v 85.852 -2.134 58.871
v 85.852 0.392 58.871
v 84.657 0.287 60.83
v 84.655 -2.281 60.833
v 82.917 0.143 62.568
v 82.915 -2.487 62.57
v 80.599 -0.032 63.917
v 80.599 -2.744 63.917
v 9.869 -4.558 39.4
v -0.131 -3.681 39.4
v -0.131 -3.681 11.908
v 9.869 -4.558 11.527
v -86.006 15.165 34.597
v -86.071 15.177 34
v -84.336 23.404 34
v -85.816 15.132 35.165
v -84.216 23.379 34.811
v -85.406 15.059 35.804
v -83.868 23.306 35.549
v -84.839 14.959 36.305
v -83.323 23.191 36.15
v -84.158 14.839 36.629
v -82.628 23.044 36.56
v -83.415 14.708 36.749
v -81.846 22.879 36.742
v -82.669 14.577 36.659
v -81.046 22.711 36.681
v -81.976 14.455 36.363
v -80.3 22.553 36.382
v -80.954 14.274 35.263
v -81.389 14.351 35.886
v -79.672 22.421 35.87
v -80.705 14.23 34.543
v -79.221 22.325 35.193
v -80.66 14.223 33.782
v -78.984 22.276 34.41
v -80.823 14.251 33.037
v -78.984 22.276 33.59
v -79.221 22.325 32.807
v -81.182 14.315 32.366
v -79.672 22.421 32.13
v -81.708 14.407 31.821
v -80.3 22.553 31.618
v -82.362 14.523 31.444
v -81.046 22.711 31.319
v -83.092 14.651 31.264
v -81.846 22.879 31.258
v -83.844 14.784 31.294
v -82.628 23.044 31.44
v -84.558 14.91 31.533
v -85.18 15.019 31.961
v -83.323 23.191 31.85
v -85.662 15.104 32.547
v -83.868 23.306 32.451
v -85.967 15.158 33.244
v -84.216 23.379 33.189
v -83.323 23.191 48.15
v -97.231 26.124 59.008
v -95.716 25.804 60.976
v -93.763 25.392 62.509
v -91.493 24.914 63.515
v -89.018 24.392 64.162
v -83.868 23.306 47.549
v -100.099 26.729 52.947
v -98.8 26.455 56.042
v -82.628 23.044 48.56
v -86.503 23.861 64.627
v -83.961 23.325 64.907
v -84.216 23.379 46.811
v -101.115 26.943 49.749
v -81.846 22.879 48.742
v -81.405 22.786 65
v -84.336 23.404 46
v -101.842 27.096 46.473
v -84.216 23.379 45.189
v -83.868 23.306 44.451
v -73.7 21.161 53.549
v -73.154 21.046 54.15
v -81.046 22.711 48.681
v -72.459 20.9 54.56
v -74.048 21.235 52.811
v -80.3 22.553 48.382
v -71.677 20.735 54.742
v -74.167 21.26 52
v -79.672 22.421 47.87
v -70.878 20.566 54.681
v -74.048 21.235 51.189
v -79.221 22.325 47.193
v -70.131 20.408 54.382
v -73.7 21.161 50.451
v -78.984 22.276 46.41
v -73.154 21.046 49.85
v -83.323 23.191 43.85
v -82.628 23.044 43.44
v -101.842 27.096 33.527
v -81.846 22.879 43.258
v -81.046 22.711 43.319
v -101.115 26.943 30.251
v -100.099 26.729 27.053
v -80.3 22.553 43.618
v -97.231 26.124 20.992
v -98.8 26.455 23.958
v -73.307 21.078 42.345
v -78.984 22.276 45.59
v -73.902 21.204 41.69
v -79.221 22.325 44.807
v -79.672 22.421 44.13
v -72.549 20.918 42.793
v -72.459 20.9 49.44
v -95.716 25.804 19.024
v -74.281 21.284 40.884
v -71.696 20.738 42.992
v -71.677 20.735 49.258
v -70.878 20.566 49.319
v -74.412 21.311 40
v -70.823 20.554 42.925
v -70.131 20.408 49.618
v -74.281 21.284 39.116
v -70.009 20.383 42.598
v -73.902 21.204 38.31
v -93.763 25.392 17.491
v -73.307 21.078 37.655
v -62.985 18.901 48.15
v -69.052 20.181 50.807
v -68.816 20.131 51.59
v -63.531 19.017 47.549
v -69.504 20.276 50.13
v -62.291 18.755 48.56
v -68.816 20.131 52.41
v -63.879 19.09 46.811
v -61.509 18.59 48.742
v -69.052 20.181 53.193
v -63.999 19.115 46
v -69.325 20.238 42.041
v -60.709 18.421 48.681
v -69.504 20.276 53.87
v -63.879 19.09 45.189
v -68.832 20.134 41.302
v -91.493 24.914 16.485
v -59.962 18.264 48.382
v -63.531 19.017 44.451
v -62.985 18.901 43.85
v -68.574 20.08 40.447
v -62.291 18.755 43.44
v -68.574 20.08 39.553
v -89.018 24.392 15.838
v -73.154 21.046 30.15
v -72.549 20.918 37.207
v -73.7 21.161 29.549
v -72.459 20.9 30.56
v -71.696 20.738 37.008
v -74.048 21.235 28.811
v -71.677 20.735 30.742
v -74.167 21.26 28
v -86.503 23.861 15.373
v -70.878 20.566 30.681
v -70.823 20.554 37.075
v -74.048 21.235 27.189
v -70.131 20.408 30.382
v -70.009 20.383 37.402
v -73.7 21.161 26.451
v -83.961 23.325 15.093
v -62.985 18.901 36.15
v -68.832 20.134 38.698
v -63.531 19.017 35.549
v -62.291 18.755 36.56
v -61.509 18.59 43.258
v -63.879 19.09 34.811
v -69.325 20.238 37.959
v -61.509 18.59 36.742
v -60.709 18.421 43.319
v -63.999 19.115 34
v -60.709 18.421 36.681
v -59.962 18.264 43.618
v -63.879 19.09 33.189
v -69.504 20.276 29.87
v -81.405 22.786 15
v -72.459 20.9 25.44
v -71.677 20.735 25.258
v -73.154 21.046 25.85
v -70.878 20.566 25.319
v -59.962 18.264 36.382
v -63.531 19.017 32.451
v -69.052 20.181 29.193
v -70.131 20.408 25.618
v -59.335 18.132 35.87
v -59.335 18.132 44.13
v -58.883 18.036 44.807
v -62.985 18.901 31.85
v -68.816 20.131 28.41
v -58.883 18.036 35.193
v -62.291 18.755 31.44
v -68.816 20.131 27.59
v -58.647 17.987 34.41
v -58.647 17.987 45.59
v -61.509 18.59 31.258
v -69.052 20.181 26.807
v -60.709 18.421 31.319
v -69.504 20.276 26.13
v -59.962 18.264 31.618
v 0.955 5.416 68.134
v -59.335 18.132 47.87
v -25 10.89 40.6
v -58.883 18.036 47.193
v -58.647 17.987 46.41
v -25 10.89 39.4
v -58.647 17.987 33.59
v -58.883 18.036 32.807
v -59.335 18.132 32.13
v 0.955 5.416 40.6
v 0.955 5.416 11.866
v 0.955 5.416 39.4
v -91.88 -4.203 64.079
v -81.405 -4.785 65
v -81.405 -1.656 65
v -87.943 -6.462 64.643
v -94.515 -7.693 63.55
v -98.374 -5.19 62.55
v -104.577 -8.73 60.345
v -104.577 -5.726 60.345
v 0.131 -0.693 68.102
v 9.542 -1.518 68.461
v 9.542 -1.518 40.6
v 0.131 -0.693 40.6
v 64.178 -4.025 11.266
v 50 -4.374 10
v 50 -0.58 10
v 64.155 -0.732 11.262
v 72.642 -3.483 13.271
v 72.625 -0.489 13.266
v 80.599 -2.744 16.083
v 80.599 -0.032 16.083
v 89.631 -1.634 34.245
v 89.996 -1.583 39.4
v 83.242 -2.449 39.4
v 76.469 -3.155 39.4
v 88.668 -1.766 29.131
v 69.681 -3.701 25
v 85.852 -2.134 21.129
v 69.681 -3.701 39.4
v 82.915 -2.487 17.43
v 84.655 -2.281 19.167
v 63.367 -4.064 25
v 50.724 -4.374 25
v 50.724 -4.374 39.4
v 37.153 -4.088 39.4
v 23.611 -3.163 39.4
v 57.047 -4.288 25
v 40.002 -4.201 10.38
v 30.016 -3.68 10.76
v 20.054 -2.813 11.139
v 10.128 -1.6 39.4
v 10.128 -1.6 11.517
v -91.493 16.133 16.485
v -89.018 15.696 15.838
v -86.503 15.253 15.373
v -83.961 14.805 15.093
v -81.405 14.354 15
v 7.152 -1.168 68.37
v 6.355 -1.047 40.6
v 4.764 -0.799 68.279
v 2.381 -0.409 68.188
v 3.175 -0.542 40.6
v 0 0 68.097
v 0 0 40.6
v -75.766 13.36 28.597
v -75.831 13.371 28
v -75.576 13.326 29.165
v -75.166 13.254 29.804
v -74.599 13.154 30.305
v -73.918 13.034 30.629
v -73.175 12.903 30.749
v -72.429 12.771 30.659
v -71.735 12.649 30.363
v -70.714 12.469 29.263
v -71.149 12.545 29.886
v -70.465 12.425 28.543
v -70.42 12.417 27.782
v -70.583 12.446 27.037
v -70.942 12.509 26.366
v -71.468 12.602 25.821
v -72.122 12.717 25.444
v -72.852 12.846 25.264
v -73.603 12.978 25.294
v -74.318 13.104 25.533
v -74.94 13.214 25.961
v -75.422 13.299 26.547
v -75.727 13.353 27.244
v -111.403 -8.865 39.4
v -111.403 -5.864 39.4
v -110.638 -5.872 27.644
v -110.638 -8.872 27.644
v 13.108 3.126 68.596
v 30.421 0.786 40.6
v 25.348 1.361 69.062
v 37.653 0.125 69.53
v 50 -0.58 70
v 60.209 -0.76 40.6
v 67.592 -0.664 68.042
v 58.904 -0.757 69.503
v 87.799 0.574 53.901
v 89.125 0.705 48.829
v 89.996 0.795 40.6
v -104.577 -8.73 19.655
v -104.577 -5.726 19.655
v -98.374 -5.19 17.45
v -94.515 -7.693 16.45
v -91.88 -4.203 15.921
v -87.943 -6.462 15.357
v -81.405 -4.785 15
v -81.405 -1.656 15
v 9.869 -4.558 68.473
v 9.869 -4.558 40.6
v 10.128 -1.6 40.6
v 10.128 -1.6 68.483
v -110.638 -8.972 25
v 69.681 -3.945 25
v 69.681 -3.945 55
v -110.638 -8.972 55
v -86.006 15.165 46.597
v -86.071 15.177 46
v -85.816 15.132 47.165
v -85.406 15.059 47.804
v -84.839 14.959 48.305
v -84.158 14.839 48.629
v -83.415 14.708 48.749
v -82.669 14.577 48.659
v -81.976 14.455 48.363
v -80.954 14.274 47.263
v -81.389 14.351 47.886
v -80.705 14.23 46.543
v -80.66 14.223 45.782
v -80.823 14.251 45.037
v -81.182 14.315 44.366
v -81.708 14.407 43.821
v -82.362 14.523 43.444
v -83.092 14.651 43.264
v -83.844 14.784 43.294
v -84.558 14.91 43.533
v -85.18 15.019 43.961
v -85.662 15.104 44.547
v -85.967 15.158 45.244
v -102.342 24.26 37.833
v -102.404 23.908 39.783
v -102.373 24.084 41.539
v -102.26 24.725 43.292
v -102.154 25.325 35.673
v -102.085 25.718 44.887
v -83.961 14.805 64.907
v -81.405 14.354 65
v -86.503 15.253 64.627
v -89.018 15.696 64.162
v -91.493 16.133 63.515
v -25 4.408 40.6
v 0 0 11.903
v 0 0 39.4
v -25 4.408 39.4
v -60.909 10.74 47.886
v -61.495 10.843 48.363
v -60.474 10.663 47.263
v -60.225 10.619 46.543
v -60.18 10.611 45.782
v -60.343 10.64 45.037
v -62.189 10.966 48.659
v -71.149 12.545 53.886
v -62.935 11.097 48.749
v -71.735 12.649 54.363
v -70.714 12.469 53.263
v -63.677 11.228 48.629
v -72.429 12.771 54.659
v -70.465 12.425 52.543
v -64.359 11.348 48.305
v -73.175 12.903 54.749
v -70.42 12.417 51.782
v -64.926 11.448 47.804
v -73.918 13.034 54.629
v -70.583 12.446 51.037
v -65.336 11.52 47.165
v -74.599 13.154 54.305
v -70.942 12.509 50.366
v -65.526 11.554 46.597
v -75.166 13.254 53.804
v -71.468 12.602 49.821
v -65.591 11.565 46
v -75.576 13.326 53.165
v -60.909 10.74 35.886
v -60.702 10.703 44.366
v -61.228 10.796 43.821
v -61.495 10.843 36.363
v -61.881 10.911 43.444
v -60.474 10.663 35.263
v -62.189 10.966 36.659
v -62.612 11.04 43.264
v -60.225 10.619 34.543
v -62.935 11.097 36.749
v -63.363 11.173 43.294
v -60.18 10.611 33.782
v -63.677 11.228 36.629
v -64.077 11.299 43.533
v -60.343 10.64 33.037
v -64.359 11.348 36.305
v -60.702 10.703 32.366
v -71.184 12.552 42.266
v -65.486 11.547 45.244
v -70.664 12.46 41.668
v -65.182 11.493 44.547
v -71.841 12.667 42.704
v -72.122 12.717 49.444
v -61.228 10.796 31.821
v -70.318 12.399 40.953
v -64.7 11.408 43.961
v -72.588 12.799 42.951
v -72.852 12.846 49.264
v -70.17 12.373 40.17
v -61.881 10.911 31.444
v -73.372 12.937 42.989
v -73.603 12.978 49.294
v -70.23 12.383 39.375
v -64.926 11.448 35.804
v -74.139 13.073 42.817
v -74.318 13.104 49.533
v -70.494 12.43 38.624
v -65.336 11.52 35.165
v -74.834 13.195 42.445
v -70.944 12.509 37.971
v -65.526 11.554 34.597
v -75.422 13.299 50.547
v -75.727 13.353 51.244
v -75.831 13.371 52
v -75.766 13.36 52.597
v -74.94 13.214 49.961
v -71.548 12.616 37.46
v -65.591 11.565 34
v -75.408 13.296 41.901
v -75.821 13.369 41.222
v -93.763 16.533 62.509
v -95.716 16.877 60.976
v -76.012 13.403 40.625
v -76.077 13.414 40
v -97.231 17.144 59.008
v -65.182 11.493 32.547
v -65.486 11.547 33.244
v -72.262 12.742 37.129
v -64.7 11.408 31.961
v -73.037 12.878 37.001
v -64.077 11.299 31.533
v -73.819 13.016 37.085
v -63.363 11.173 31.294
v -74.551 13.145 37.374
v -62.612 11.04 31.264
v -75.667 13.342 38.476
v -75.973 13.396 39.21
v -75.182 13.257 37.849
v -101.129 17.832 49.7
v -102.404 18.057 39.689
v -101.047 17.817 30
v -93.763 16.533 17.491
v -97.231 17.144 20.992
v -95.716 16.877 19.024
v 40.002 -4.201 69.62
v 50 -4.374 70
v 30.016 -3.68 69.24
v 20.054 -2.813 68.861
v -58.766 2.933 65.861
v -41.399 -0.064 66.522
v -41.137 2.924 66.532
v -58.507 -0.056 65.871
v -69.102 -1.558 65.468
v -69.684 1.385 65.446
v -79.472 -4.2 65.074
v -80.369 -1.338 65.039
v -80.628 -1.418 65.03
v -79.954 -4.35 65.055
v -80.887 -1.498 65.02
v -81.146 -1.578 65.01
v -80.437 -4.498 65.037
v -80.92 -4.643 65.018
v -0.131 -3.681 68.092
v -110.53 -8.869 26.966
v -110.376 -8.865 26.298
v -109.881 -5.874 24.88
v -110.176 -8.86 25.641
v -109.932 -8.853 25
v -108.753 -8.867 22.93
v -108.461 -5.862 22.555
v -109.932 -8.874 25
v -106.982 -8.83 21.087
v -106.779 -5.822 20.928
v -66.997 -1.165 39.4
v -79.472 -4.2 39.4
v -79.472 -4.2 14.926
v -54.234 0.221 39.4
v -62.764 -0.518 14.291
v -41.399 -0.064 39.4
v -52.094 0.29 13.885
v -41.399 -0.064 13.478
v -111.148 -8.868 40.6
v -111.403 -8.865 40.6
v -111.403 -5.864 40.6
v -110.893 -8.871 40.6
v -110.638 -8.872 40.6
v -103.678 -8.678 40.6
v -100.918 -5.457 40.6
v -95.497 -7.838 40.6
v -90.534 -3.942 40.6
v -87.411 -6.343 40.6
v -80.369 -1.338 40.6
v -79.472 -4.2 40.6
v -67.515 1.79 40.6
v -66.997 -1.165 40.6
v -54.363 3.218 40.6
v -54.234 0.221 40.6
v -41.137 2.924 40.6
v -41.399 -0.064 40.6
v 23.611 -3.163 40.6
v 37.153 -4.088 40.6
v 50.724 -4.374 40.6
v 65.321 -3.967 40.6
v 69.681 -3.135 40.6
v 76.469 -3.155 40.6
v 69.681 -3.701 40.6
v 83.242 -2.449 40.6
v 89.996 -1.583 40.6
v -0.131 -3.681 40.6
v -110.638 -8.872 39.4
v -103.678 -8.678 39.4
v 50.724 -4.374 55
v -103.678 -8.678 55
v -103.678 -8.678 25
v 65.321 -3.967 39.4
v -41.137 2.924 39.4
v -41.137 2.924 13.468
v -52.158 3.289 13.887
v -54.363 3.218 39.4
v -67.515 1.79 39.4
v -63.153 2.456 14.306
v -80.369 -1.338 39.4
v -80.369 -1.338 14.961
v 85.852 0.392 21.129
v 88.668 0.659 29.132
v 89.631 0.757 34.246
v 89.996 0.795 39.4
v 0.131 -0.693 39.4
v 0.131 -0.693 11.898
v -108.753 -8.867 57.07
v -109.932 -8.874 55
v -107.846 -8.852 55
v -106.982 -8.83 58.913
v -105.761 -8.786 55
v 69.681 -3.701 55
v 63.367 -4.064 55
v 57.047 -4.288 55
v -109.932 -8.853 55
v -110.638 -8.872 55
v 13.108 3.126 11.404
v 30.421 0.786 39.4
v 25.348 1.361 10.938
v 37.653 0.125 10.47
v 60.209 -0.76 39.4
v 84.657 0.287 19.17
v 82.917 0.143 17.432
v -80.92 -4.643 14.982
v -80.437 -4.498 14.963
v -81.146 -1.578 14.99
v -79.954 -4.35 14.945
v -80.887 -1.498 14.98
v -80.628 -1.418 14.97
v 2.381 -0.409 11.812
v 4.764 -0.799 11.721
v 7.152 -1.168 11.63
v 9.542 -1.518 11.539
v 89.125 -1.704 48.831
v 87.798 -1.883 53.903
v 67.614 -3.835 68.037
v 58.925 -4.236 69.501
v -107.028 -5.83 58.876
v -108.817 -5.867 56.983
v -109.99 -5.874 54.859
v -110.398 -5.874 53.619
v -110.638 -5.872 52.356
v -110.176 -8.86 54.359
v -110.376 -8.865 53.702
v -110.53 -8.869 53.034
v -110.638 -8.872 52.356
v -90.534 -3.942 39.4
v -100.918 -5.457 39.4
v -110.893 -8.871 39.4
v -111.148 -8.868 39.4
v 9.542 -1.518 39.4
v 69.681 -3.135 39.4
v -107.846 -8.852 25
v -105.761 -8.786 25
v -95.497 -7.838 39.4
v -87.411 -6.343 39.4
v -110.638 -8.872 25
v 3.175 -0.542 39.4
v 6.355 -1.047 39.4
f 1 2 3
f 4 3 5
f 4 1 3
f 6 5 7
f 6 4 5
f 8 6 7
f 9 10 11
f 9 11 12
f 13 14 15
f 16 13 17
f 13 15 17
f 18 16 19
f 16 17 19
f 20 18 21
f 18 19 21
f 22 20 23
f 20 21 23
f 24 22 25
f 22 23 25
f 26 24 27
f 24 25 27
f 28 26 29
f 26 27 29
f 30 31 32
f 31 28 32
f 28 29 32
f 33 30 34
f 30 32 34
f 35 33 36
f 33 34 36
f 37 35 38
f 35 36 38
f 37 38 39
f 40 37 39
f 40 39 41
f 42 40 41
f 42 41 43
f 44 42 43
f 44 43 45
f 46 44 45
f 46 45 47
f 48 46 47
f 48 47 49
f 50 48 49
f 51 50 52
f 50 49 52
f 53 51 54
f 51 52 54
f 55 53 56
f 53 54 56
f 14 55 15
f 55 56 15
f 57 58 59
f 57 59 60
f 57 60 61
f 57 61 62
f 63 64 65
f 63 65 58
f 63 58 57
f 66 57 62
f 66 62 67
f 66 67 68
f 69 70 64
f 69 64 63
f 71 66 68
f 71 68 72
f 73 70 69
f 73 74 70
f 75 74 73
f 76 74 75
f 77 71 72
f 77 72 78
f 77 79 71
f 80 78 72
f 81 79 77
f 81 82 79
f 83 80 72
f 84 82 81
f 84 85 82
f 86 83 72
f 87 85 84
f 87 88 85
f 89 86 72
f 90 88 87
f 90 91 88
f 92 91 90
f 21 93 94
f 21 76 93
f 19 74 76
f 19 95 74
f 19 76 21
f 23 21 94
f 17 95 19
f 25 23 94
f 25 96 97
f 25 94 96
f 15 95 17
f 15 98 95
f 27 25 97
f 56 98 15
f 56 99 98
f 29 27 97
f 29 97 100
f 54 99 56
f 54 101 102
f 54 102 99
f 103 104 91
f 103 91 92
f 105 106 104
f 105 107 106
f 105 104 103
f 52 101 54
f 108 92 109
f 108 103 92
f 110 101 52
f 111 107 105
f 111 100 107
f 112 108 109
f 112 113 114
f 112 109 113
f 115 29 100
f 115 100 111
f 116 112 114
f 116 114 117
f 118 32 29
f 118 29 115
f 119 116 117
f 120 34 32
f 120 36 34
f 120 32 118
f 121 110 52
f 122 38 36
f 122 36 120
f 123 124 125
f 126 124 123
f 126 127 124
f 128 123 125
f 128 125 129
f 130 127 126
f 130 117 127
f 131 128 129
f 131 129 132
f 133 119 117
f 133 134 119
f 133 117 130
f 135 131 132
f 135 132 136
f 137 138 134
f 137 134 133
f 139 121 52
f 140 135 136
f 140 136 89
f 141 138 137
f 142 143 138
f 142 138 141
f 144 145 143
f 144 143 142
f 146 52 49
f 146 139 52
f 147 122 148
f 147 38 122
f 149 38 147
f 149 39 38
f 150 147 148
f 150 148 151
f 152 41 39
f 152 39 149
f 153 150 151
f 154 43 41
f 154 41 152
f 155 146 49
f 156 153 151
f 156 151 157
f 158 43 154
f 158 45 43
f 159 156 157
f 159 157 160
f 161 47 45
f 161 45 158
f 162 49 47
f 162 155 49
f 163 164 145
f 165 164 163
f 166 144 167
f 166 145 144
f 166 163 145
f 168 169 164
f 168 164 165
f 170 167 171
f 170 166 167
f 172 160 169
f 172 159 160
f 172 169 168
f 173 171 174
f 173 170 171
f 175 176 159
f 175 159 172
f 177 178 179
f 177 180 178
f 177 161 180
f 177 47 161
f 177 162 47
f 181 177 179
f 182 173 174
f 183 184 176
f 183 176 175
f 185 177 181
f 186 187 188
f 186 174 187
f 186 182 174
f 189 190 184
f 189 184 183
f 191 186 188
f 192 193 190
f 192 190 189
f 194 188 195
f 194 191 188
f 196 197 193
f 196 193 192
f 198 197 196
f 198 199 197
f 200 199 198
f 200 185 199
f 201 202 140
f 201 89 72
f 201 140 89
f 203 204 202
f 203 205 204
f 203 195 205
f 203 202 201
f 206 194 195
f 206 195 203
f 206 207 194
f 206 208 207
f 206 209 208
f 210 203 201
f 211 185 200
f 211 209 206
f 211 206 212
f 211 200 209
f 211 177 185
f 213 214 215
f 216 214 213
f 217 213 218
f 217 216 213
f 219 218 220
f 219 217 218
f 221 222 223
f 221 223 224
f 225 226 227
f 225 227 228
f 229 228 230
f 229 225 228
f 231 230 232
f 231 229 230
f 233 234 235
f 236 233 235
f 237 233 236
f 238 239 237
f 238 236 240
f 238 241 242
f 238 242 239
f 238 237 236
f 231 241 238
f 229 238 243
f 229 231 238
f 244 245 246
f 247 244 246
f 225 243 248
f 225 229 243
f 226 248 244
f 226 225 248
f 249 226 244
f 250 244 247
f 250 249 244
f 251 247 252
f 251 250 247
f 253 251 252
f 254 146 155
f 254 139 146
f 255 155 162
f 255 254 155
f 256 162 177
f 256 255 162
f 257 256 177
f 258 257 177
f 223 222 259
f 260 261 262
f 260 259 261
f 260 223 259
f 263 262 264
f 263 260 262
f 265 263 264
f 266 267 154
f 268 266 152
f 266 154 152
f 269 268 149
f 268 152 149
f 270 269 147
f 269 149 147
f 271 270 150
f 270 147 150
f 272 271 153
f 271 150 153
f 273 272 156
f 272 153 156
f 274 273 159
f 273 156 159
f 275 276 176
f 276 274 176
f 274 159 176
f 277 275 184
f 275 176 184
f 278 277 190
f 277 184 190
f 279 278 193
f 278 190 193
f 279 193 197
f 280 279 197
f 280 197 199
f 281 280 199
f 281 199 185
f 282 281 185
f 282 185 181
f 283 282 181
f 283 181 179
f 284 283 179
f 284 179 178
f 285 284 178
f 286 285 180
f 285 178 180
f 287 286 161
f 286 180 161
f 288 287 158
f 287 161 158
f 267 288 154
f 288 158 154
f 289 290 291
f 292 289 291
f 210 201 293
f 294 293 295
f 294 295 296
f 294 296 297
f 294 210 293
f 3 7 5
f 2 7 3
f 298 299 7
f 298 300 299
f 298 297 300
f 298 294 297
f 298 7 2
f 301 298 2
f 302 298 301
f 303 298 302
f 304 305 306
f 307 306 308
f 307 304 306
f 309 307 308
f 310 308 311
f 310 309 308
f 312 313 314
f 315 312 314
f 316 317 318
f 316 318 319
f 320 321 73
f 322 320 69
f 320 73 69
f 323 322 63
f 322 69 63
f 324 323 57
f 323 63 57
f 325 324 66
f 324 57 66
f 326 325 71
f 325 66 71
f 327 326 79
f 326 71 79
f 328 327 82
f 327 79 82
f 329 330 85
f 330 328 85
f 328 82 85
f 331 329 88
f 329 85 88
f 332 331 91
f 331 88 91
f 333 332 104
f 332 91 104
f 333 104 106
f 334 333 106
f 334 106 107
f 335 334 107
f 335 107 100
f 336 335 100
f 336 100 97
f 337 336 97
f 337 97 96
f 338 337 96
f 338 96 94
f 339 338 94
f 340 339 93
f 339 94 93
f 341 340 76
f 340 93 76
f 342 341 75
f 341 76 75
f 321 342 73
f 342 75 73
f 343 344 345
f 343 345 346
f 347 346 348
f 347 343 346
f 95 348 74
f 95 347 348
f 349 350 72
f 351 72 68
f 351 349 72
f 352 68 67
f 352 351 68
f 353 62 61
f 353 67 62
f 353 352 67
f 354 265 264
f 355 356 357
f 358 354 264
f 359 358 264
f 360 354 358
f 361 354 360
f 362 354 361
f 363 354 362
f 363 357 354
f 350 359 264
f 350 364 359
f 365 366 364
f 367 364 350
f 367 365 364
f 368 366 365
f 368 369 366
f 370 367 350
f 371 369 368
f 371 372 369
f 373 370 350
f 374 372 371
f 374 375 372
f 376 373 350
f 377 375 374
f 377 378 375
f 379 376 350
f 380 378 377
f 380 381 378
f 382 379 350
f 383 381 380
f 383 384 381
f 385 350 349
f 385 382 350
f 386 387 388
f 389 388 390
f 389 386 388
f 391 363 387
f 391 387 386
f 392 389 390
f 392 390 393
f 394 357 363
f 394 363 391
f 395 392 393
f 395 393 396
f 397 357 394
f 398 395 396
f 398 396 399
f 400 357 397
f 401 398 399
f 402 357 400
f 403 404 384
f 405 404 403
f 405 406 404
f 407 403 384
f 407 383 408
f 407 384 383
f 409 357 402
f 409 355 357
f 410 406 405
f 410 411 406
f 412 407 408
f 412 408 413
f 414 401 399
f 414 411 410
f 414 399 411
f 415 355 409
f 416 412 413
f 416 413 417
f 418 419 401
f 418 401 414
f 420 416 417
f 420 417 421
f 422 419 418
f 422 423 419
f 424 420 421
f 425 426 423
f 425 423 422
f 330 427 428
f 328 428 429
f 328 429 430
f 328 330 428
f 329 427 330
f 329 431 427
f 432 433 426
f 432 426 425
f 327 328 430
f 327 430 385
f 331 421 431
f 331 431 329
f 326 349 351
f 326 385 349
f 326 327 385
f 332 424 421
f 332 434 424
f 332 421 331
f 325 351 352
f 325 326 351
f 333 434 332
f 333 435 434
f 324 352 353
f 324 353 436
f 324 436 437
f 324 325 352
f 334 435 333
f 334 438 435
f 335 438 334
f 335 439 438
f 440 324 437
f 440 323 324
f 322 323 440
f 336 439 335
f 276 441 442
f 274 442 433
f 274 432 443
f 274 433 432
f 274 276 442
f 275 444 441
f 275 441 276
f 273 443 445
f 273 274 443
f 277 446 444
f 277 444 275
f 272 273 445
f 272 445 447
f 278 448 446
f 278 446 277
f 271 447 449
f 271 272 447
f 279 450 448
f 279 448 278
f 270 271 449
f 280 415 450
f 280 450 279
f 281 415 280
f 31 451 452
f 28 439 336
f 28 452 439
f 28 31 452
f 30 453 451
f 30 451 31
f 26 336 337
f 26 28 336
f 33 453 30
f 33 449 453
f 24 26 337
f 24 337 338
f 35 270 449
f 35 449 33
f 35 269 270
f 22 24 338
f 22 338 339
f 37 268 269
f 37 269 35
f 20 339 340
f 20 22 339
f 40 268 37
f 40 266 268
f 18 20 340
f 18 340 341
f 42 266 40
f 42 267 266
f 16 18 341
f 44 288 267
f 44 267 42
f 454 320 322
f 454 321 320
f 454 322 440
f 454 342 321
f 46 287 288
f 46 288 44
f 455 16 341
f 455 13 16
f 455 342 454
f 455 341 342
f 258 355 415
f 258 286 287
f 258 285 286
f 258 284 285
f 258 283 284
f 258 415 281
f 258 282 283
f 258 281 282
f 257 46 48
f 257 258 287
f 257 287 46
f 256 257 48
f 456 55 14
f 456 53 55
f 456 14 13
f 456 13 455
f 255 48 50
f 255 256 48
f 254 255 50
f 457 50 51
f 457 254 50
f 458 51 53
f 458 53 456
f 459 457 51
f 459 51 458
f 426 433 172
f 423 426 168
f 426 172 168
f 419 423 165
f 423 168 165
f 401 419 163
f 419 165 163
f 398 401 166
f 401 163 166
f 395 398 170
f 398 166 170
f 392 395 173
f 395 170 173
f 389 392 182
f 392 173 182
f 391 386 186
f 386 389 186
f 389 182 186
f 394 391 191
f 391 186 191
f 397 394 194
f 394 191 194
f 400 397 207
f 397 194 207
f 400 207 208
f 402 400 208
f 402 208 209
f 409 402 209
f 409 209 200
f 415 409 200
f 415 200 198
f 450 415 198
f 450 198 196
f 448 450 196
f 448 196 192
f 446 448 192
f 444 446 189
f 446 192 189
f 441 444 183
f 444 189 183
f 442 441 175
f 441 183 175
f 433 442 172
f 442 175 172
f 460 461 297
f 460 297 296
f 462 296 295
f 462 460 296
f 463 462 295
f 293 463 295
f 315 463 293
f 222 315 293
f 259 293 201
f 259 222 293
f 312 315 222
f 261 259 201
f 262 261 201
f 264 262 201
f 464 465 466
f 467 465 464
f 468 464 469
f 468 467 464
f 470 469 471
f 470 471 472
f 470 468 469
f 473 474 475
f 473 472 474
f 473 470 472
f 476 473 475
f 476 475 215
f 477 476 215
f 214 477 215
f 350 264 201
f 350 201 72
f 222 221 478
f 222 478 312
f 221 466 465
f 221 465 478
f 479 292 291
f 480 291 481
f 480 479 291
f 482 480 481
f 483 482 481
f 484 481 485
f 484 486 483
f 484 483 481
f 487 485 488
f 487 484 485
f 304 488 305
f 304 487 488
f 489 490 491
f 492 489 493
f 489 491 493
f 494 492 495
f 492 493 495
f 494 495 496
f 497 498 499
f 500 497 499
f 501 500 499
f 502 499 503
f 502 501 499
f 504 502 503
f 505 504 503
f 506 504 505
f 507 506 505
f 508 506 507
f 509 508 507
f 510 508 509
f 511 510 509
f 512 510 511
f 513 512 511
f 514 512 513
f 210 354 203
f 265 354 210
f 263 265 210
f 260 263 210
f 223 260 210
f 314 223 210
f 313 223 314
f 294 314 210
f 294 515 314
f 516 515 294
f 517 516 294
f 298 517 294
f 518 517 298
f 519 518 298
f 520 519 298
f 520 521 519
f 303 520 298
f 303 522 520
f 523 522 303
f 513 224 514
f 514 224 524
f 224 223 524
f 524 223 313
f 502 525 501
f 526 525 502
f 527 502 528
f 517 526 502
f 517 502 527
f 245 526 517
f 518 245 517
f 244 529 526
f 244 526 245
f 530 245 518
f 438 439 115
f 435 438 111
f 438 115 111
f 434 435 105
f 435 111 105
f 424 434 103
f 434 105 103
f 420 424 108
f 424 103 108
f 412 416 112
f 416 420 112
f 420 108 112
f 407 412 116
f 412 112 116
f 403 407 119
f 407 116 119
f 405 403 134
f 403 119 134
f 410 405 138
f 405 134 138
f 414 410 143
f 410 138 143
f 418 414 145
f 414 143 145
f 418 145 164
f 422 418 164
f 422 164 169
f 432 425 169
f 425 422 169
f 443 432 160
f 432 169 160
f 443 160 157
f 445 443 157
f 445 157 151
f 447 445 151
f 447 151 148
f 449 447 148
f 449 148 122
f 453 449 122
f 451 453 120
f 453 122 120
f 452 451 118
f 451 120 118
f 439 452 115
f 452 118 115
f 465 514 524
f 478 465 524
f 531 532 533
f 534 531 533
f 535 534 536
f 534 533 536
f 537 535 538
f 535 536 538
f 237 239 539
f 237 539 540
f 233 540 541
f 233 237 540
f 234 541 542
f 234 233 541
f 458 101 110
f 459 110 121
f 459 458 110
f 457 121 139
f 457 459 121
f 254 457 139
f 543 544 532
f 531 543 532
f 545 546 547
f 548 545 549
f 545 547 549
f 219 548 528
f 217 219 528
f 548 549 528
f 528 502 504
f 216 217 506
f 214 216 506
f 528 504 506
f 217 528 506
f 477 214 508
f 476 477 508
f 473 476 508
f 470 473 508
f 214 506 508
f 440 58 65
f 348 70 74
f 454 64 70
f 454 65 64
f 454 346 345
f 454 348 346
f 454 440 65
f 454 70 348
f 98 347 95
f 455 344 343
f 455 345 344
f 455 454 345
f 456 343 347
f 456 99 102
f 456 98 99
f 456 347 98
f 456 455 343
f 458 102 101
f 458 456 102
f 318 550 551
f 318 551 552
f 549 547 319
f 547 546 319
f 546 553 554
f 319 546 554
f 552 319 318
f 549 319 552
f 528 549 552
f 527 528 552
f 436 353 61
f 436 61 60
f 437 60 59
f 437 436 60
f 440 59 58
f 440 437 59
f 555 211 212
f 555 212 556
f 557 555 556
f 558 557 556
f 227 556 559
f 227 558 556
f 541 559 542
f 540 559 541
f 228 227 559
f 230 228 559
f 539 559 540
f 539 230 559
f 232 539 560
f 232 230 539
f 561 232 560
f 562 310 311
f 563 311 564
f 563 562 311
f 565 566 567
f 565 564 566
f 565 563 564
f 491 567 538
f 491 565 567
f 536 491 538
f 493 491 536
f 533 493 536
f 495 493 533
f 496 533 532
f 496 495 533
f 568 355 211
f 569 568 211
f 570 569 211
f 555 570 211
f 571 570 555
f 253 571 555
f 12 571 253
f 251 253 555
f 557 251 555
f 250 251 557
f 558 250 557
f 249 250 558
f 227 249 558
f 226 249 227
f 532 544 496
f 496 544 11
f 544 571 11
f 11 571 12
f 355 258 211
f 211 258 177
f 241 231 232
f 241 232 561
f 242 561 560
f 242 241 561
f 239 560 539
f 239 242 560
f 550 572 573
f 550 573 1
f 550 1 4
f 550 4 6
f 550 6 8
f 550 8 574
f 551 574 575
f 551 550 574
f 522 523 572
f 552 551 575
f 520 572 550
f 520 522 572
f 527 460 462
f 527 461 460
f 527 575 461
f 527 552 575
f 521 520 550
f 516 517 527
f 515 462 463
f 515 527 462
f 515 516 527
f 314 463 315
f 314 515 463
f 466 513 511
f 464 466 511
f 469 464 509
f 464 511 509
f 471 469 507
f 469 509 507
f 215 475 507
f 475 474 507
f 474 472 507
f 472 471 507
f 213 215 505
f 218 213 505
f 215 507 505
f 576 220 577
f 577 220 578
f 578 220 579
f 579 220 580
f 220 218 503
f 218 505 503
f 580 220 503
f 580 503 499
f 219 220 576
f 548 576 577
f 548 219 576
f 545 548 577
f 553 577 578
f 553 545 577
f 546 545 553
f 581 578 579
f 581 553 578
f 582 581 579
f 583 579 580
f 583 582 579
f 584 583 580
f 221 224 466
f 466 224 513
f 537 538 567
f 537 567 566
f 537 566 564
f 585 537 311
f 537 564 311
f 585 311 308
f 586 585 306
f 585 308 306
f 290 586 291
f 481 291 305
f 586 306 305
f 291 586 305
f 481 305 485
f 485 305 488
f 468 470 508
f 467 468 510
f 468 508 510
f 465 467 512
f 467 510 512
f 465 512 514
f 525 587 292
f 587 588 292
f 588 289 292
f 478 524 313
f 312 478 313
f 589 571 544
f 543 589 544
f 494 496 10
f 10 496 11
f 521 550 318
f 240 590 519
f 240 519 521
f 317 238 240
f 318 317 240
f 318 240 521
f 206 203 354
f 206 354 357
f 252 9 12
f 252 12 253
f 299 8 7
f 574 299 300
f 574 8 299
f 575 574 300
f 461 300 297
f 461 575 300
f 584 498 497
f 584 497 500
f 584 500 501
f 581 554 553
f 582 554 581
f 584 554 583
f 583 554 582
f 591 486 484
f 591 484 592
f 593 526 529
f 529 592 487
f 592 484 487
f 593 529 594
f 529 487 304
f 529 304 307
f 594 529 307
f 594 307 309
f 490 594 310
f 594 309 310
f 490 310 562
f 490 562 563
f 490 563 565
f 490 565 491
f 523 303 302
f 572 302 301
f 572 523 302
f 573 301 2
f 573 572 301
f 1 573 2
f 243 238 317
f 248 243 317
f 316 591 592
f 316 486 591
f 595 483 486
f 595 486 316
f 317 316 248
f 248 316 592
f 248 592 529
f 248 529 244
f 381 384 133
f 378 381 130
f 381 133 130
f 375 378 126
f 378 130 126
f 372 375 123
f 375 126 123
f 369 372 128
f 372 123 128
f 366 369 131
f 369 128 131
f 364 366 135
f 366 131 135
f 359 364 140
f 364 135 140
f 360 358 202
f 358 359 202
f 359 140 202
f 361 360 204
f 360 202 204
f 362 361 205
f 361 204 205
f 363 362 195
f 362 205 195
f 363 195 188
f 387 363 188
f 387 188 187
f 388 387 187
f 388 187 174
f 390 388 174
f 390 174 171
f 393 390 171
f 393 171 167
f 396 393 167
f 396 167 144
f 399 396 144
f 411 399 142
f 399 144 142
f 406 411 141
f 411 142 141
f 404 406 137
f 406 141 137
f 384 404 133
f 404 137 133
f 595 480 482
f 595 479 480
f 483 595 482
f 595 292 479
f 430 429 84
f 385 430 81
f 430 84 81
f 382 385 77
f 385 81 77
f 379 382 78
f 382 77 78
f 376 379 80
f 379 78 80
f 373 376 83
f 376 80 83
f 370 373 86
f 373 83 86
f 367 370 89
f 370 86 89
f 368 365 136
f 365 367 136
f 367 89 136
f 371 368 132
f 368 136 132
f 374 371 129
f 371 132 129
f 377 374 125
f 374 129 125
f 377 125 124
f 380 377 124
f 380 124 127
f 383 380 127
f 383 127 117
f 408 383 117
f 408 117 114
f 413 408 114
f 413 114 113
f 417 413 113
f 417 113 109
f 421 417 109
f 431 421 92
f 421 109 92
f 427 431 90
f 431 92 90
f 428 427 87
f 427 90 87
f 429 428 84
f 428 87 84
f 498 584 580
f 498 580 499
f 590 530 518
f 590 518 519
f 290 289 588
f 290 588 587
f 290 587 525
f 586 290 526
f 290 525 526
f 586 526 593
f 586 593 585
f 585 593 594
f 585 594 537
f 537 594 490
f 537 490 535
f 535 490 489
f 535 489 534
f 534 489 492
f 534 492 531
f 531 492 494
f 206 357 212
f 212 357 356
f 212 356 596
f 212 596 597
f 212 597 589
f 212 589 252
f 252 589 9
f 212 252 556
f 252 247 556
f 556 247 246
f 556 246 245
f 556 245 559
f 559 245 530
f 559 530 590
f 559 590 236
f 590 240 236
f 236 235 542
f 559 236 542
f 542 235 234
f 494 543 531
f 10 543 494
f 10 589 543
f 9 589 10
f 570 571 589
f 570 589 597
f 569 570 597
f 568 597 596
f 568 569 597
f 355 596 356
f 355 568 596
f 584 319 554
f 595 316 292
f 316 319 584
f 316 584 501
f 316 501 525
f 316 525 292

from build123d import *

# Parameters (mm, degrees)
EXTRUDE_1_DEPTH          = 80
CUT_EXTRUDE_1_DEPTH      = 80
CUT_EXTRUDE_1_DEPTH_BACK = 80
SKETCH_2_OUTSIDE_W       = 249.571
SKETCH_2_OUTSIDE_H       = 126.166
EXTRUDE_2_DEPTH          = 80
SKETCH_3_R               = 3
SKETCH_3_R_2             = 2.75
CUT_EXTRUDE_2_DEPTH      = 9
CUT_EXTRUDE_3_DEPTH      = 16
CUT_EXTRUDE_3_DEPTH_BACK = 8
SKETCH_4_W               = 130
SKETCH_4_H               = 1.2
CUT_EXTRUDE_4_DEPTH      = 80
CUT_EXTRUDE_4_DEPTH_BACK = 80
SKETCH_6_OUTSIDE_W       = 274.986
SKETCH_6_OUTSIDE_H       = 130.25
CUT_EXTRUDE_5_DEPTH      = 4
CUT_EXTRUDE_5_DEPTH_BACK = 10
SKETCH_7_W               = 148.853321433
SKETCH_7_H               = 1.2
EXTRUDE_START            = 25
EXTRUDE_3_DEPTH          = 30


with BuildPart() as part:
    # 草图1 → 凸台-拉伸1 (new body)
    with BuildSketch(Plane.XY):
        with BuildLine():
            Line((-103.404814066, 18.233058655), (0, 0))
            ThreePointArc((0, 0), (50, -4.374433176), (100, 0))
            Line((100, 0), (99.652703645, 1.969615506))
            ThreePointArc((99.652703645, 1.969615506), (50.154483855, -0.584955192), (0.955064977, 5.416442642))
            Line((0.955064977, 5.416442642), (-101.841980467, 27.096328432))
            Line((-101.841980467, 27.096328432), (-103.404814066, 18.233058655))
        make_face()
    extrude(amount=EXTRUDE_1_DEPTH)

    # 草图2 outside → 切除-拉伸1 (cut, two sides: drawn at the far end of the back side and taken through both)
    with BuildSketch(Plane(origin=(0, 0, 0), x_dir=(1, 0, 0), z_dir=(0, 1, 0)).offset(-CUT_EXTRUDE_1_DEPTH_BACK)):
        with Locations((-1.7025, -40)):
            Rectangle(SKETCH_2_OUTSIDE_W, SKETCH_2_OUTSIDE_H)
        with BuildLine():
            Line((-81.404814066, -15), (50, -10))
            ThreePointArc((50, -10), (65.598710239, -11.535484205), (80.598631148, -16.082994028))
            ThreePointArc((80.598631148, -16.082994028), (83.701137928, -18.110683802), (85.85203147, -21.129082567))
            ThreePointArc((85.85203147, -21.129082567), (90, -40), (85.85203147, -58.870917433))
            ThreePointArc((85.85203147, -58.870917433), (83.701137928, -61.889316198), (80.598631148, -63.917005972))
            ThreePointArc((80.598631148, -63.917005972), (65.598710239, -68.464515795), (50, -70))
            Line((50, -70), (-81.404814066, -65))
            ThreePointArc((-81.404814066, -65), (-86.503052151, -64.626694449), (-91.492535917, -63.514741053))
            ThreePointArc((-91.492535917, -63.514741053), (-94.787242262, -61.803307698), (-97.230517167, -59.007864662))
            ThreePointArc((-97.230517167, -59.007864662), (-102.404814066, -40), (-97.230517167, -20.992135338))
            ThreePointArc((-97.230517167, -20.992135338), (-94.787242262, -18.196692302), (-91.492535917, -16.485258947))
            ThreePointArc((-91.492535917, -16.485258947), (-86.503052151, -15.373305551), (-81.404814066, -15))
        make_face(mode=Mode.SUBTRACT)
    extrude(amount=CUT_EXTRUDE_1_DEPTH + CUT_EXTRUDE_1_DEPTH_BACK, mode=Mode.SUBTRACT)

    # 草图5 → 凸台-拉伸2 (add)
    with BuildSketch(Plane.XY):
        with BuildLine():
            Line((0.130982352, -0.692946324), (-41.136860859, 2.924444243))
            ThreePointArc((-41.136860859, 2.924444243), (-60.962244436, 2.718445526), (-80.369357278, -1.337690645))
            ThreePointArc((-80.369357278, -1.337690645), (-107.081623518, -5.831422582), (-134.01223301, -2.919195453))
            Line((-134.01223301, -2.919195453), (-134.739648073, -5.8296709))
            ThreePointArc((-134.739648073, -5.8296709), (-106.993215622, -8.83011964), (-79.471740806, -4.200256744))
            ThreePointArc((-79.471740806, -4.200256744), (-60.638237212, -0.264006371), (-41.398825562, -0.064096286))
            Line((-41.398825562, -0.064096286), (-0.130982352, -3.681486853))
            Line((-0.130982352, -3.681486853), (9.869017648, -4.558050852))
            Line((9.869017648, -4.558050852), (10.130982352, -1.569510322))
            Line((10.130982352, -1.569510322), (0.130982352, -0.692946324))
        make_face()
    extrude(amount=EXTRUDE_2_DEPTH)

    # 草图3 → 切除-拉伸2 (cut)
    with BuildSketch(Plane(origin=(1.134352673, 5.378630886, 0), x_dir=(0.9784760335424555, -0.206360489878813, 0), z_dir=(0.206360489878813, 0.9784760335424555, 0))):
        with Locations((-74.207967172, -40)):
            Circle(SKETCH_3_R)
        with Locations((-74.207967172, -28)):
            Circle(SKETCH_3_R_2)
        with Locations((-63.815662327, -34)):
            Circle(SKETCH_3_R_2)
        with Locations((-63.815662327, -46)):
            Circle(SKETCH_3_R_2)
        with Locations((-74.207967172, -52)):
            Circle(SKETCH_3_R_2)
        with Locations((-84.600272018, -46)):
            Circle(SKETCH_3_R_2)
        with Locations((-84.600272018, -34)):
            Circle(SKETCH_3_R_2)
    extrude(amount=-CUT_EXTRUDE_2_DEPTH, mode=Mode.SUBTRACT)

    # 草图4 → 切除-拉伸3 (cut, two sides: drawn at the far end of the back side and taken through both)
    with BuildSketch(Plane(origin=(0, 0, 0), x_dir=(1, 0, 0), z_dir=(0, 1, 0)).offset(-CUT_EXTRUDE_3_DEPTH_BACK)):
        with Locations((40, -40)):
            Rectangle(SKETCH_4_W, SKETCH_4_H)
    extrude(amount=CUT_EXTRUDE_3_DEPTH + CUT_EXTRUDE_3_DEPTH_BACK, mode=Mode.SUBTRACT)

    # 草图6 outside → 切除-拉伸4 (cut, two sides: drawn at the far end of the back side and taken through both)
    with BuildSketch(Plane(origin=(0, 0, 0), x_dir=(1, 0, 0), z_dir=(0, 1, 0)).offset(-CUT_EXTRUDE_4_DEPTH_BACK)):
        with Locations((-22.372, -40)):
            Rectangle(SKETCH_6_OUTSIDE_W, SKETCH_6_OUTSIDE_H)
        with BuildLine():
            Line((136.18747393, -6.720535905), (136.18747393, -73.279464095))
            Line((136.18747393, -73.279464095), (-81.404814066, -65))
            ThreePointArc((-81.404814066, -65), (-93.222494497, -63.824675343), (-104.577187887, -60.344747642))
            ThreePointArc((-104.577187887, -60.344747642), (-108.681527165, -57.165161548), (-110.63849353, -52.356247816))
            ThreePointArc((-110.63849353, -52.356247816), (-111.404814066, -40), (-110.63849353, -27.643752184))
            ThreePointArc((-110.63849353, -27.643752184), (-108.681527165, -22.834838452), (-104.577187887, -19.655252358))
            ThreePointArc((-104.577187887, -19.655252358), (-93.222494497, -16.175324657), (-81.404814066, -15))
            Line((-81.404814066, -15), (136.18747393, -6.720535905))
        make_face(mode=Mode.SUBTRACT)
    extrude(amount=CUT_EXTRUDE_4_DEPTH + CUT_EXTRUDE_4_DEPTH_BACK, mode=Mode.SUBTRACT)

    # 草图7 → 切除-拉伸5 (cut, two sides: drawn at the far end of the back side and taken through both)
    with BuildSketch(Plane(origin=(0, 0, 0), x_dir=(1, 0, 0), z_dir=(0, 1, 0)).offset(-CUT_EXTRUDE_5_DEPTH_BACK)):
        with Locations((-99.426660717, -40)):
            Rectangle(SKETCH_7_W, SKETCH_7_H)
    extrude(amount=CUT_EXTRUDE_5_DEPTH + CUT_EXTRUDE_5_DEPTH_BACK, mode=Mode.SUBTRACT)

    # 草图8 → 凸台-拉伸3 (add)
    with BuildSketch(Plane.XY.offset(EXTRUDE_START)):
        Polygon((-110.63849353, -8.872435364), (65.321019644, -3.966533563), (69.680983926, -3.134969109), (69.680983926, -3.944974028), (-110.63849353, -8.972435364), align=None)
    extrude(amount=EXTRUDE_3_DEPTH)


solid = part.part
